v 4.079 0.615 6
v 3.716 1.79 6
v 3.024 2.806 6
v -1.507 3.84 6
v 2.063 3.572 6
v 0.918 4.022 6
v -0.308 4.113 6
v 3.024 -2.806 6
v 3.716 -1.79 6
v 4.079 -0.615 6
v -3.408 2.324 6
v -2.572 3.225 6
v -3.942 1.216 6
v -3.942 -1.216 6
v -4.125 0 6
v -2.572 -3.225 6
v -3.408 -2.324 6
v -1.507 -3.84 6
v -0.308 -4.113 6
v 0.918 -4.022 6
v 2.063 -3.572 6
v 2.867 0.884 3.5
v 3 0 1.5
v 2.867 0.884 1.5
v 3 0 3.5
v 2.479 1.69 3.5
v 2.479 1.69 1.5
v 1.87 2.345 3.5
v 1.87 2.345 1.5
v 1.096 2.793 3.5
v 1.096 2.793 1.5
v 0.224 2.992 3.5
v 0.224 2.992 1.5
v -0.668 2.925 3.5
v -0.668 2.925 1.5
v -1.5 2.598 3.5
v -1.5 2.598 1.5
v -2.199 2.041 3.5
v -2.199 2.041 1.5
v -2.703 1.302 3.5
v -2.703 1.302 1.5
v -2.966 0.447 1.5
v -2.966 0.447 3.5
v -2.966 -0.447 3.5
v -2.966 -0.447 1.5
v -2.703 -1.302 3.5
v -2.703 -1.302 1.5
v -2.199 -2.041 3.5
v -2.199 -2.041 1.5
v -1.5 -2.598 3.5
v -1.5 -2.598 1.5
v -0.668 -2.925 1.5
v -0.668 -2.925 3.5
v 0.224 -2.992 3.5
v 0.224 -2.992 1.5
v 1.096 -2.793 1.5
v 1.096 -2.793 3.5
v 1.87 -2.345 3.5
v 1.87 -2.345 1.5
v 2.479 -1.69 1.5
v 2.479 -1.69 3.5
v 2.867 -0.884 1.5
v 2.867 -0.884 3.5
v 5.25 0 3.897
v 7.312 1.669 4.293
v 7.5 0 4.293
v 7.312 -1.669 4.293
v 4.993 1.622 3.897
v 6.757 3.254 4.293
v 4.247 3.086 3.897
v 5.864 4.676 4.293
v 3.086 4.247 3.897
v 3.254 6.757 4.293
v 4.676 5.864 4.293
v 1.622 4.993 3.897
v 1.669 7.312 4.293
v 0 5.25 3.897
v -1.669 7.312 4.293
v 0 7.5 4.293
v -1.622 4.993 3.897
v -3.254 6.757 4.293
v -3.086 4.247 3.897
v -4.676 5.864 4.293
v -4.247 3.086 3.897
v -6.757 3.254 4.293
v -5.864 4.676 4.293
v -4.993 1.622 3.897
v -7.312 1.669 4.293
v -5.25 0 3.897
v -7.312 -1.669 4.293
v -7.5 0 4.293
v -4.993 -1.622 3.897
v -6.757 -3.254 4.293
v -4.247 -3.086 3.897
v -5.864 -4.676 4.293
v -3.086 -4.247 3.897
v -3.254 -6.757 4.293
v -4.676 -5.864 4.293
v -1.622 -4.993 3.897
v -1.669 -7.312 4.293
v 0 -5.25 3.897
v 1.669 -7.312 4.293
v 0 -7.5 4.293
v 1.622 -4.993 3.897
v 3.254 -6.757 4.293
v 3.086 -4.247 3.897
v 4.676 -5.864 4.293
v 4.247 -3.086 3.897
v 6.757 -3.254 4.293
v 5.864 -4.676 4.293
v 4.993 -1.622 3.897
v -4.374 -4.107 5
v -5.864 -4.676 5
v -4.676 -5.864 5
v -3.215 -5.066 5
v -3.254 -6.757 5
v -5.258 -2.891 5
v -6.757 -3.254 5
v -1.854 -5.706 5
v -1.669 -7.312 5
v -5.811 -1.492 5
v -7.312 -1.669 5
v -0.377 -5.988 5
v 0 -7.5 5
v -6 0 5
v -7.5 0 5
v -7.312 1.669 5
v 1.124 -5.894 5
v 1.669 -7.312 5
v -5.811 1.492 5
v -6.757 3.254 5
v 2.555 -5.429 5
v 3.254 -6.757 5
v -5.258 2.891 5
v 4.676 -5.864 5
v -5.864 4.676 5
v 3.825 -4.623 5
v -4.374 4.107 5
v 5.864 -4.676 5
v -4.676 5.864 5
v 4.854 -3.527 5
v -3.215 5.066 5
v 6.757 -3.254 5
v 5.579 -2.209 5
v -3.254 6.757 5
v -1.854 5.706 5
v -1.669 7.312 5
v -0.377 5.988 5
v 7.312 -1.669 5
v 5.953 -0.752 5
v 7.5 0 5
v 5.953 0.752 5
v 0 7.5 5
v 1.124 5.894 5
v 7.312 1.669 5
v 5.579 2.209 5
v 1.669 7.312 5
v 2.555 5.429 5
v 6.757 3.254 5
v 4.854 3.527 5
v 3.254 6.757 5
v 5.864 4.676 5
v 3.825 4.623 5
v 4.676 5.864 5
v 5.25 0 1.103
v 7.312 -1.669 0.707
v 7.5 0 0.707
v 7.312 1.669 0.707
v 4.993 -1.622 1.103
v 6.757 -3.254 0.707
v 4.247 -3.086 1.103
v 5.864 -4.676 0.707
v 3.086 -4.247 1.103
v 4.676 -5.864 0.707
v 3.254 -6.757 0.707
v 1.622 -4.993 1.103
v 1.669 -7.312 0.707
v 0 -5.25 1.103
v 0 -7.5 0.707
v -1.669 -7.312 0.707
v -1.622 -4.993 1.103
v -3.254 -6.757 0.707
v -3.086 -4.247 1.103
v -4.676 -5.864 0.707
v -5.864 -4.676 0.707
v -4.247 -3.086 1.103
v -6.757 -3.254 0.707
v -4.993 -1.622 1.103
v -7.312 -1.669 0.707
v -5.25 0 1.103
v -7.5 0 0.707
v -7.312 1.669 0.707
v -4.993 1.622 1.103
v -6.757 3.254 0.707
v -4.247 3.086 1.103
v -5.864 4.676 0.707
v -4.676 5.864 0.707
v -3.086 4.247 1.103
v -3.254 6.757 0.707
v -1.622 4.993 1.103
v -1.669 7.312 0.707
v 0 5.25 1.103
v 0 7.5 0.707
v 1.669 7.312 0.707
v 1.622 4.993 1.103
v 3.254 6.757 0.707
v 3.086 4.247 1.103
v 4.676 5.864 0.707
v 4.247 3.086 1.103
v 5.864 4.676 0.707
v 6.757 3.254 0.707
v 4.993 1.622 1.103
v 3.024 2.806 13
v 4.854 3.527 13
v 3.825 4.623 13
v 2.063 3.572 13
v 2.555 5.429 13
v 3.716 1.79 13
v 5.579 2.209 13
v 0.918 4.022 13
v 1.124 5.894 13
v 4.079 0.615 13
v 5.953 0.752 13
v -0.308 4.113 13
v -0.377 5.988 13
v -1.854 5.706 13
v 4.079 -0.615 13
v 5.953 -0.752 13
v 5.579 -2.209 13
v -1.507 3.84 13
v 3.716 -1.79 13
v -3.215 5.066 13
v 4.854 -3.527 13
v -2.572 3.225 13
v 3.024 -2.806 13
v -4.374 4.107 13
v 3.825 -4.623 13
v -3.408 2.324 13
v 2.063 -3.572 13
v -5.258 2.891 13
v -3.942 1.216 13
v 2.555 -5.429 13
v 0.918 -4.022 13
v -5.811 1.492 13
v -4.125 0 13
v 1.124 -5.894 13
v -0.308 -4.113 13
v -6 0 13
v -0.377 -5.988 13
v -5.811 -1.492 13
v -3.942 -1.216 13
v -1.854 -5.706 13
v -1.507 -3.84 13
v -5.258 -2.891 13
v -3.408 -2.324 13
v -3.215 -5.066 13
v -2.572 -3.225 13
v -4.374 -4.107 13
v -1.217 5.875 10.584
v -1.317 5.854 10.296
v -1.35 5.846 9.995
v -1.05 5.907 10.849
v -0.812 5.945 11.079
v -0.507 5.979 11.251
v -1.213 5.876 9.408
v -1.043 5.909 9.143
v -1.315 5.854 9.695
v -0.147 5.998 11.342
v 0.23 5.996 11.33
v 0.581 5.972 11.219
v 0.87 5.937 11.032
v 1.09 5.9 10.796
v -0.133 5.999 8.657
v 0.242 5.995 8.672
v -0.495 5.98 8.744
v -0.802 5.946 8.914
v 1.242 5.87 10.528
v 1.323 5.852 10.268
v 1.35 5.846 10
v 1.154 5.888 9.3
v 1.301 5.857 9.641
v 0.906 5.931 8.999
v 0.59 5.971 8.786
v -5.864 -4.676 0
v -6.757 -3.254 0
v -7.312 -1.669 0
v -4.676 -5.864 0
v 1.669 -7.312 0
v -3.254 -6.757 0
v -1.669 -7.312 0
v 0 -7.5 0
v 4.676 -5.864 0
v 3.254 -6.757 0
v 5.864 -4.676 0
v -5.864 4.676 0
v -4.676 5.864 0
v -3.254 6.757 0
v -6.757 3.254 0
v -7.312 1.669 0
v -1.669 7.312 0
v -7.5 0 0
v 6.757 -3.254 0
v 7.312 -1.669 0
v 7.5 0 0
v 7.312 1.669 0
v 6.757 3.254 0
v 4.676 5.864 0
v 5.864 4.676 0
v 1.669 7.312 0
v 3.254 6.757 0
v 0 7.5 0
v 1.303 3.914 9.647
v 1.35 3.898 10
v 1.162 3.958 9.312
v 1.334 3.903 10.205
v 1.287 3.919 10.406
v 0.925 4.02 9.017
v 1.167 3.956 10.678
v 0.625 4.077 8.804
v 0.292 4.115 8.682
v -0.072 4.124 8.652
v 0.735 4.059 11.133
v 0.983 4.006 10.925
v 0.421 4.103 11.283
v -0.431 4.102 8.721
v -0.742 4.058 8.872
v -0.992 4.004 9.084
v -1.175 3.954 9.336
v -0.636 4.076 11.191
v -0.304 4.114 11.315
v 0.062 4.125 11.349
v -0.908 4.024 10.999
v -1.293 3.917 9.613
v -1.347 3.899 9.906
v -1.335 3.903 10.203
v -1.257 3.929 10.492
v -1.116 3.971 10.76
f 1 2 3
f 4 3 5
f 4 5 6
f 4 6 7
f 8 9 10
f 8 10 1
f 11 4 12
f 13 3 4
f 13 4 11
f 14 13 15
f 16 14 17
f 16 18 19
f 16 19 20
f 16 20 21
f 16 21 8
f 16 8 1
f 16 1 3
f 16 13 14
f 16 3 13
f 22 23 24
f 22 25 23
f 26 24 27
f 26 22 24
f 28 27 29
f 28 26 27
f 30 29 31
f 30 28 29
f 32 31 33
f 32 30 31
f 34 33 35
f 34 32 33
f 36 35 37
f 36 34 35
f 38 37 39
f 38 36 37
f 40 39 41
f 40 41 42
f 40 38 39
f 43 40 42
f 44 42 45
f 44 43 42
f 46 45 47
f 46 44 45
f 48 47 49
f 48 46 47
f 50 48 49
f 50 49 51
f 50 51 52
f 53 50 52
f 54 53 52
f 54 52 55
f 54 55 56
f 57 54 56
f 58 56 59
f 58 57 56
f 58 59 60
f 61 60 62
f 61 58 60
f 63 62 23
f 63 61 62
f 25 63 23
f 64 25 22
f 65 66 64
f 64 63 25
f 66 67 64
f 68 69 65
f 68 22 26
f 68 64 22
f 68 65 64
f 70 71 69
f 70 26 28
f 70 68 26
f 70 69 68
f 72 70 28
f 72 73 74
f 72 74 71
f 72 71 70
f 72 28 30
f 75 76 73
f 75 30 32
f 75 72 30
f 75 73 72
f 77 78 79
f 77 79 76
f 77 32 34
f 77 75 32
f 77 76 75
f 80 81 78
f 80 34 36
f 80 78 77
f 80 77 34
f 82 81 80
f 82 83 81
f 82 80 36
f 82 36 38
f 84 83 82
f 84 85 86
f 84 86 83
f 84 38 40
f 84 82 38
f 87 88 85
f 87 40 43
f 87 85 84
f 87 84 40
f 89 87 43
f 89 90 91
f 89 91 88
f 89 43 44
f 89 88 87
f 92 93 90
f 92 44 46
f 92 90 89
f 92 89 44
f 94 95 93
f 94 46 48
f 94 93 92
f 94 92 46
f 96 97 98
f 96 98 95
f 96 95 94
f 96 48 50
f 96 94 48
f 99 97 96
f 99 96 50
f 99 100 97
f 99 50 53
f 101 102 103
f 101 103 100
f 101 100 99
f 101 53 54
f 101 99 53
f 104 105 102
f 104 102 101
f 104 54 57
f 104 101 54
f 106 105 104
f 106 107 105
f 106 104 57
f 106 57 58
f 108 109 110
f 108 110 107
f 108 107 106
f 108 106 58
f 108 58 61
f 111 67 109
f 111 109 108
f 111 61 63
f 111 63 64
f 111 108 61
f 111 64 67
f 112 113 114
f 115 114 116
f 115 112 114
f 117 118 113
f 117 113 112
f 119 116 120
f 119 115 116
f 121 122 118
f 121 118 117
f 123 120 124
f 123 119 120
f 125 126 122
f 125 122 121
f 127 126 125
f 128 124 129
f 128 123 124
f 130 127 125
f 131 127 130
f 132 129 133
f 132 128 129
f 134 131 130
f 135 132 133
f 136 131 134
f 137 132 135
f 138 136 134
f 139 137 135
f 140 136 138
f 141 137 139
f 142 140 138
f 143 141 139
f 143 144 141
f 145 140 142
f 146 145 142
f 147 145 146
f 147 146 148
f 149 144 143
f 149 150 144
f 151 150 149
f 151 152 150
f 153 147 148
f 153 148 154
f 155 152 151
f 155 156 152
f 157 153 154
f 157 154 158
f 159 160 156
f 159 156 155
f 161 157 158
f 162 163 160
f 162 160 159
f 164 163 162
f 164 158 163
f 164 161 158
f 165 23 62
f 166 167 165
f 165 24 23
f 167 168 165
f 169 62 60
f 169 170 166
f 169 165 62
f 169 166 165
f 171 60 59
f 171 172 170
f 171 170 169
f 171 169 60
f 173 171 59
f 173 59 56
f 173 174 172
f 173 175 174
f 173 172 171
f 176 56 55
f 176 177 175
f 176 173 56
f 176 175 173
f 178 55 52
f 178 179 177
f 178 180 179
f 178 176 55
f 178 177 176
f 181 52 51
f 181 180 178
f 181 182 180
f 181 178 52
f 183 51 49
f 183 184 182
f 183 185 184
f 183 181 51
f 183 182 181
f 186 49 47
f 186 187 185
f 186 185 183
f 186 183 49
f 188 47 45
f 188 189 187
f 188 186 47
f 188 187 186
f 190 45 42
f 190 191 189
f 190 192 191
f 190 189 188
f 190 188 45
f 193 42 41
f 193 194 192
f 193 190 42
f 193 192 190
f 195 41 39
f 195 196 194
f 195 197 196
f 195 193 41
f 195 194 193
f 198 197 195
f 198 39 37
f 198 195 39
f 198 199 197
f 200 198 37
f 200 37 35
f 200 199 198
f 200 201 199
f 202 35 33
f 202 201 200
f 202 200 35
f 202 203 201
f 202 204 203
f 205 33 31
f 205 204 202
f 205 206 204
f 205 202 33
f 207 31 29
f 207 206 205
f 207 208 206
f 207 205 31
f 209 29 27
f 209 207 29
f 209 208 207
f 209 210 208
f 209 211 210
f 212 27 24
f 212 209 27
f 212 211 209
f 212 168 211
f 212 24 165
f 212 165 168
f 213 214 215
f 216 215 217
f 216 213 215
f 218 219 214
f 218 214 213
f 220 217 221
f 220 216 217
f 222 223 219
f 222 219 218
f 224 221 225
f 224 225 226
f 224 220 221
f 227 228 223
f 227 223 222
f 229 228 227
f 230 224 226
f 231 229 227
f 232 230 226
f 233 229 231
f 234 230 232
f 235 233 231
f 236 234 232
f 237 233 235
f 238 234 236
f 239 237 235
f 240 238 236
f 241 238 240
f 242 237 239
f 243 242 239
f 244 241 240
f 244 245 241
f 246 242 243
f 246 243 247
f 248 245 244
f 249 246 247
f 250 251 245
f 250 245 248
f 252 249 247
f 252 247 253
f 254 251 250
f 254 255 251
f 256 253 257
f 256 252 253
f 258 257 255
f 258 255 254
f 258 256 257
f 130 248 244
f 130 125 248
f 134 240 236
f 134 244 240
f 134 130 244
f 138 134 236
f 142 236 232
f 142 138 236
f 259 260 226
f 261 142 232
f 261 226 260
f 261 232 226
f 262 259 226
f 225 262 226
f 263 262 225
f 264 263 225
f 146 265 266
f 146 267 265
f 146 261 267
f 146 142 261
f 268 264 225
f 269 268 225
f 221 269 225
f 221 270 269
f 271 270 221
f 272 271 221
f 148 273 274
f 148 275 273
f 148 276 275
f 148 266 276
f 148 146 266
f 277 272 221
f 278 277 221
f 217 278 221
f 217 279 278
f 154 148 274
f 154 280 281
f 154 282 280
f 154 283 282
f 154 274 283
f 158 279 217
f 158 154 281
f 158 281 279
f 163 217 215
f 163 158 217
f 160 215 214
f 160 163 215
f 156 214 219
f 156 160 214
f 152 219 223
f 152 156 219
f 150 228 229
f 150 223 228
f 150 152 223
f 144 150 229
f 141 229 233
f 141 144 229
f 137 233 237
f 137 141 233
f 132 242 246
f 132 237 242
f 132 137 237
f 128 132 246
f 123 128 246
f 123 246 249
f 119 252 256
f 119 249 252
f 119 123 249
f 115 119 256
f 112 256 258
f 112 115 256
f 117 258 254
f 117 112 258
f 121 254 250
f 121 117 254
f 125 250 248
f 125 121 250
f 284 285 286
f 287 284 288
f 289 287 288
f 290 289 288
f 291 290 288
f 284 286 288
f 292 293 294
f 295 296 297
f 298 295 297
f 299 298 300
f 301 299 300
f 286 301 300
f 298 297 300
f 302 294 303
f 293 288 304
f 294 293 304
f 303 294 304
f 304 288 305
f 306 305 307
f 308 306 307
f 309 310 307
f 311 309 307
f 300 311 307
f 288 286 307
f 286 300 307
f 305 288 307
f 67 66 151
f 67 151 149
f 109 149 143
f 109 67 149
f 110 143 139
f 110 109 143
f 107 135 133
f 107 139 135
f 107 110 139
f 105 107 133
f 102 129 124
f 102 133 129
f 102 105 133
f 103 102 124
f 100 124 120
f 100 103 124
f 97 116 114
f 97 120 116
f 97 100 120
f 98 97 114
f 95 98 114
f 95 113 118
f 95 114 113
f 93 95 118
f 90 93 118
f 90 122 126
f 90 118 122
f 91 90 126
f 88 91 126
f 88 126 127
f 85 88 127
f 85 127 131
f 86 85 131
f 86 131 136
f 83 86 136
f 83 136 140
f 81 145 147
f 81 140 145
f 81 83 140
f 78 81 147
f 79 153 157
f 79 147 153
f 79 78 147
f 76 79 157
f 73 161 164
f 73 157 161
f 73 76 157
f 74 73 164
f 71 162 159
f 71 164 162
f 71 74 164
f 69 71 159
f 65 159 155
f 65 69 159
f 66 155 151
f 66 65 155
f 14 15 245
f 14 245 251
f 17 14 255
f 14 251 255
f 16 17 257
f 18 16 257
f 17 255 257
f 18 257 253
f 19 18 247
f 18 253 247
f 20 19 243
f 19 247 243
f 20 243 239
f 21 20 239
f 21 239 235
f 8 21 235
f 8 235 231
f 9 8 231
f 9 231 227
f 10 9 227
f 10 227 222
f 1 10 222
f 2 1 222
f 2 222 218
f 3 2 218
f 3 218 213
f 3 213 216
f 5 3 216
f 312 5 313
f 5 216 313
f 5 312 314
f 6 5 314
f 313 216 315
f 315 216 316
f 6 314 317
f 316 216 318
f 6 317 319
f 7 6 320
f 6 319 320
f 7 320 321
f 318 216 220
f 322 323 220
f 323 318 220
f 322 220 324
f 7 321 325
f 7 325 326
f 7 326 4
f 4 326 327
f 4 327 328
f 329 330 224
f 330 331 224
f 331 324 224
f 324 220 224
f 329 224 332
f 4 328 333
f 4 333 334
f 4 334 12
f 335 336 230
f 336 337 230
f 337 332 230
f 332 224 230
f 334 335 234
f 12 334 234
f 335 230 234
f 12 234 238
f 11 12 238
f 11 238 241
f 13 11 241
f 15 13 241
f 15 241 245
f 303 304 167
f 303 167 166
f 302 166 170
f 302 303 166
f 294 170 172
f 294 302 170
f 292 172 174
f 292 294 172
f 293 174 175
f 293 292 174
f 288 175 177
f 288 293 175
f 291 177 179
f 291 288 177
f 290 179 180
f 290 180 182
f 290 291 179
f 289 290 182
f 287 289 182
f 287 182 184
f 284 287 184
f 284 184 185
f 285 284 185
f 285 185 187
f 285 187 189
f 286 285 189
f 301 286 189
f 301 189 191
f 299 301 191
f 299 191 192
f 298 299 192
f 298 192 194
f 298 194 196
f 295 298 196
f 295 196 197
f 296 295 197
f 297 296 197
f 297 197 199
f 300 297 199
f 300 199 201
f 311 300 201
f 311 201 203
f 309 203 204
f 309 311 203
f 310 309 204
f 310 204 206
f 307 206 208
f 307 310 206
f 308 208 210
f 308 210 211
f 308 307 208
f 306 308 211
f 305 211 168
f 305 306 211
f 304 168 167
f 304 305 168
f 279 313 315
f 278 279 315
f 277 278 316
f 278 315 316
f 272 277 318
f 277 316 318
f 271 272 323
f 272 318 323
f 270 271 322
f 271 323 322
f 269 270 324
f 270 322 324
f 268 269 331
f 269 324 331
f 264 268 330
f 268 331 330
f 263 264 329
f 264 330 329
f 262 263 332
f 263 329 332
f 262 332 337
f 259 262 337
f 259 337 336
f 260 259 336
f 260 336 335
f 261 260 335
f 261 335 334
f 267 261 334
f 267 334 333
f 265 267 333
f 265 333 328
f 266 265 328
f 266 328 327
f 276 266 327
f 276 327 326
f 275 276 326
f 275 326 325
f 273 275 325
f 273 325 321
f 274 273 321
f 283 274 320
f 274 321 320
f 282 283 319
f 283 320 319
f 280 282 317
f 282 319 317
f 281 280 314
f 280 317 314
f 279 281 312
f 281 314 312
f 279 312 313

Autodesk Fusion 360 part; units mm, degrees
sketch "Esquisse1" plane through (0, 0, 0) normal (0, 0, 1) x (1, 0, 0)
  circle A0 centre (0, 0) radius 7.5
  dimension "d1" = 15
extrude "Extrusion1" add sketch "Esquisse1" along normal blind 5
sketch "Esquisse2" plane through (0, 0, 0) normal (0, 1, 0) x (1, 0, 0)
sketch "Esquisse3" plane through (0, 0, 0) normal (0, 1, 0) x (1, 0, 0)
  line L0 (3, -3.5) -> (8.18, -4.4134)
  line L1 (8.18, -4.4134) -> (8.18, -0.5866)
  line L2 (8.18, -0.5866) -> (3, -1.5)
  line L3 (3, -1.5) -> (3, -3.5)
  line L4 (0, -1.75) -> (0, -22.5)
  dimension "d4" = 2
  dimension "d6" = 1.5
  dimension "d7" = 100
  dimension "d8" = 100
  dimension "d9" = 3
revolve "Révolution1" cut sketch "Esquisse3" angle 360 about axis through (0, 0, 1.75) along (0, 0, 1)
sketch "Esquisse4" plane through (0, 0, 5) normal (0, 0, 1) x (-1, 0, 0)
  circle A0 centre (0, 0) radius 7.5
  circle A1 centre (0, 0) radius 6
  dimension "d11" = 12
extrude "Extrusion2" add sketch "Esquisse4" along normal blind 8 contours A1
sketch "Esquisse5" plane through (0, 0, 13) normal (0, 0, 1) x (-1, 0, 0)
  circle A0 centre (0, 0) radius 6
  circle A1 centre (0, 0) radius 4.125
  dimension "d14" = 8.25
sketch "Esquisse6" plane through (0, 0, 13) normal (0, 0, 1) x (1, 0, 0)
extrude "Extrusion3" cut sketch "Esquisse5" against normal blind 7 contours A1
sketch "Esquisse7" plane through (0, 0, 0) normal (0, 1, 0) x (1, 0, 0)
  circle A0 centre (0, -10) radius 1.35
  line L0 (-6, -13) -> (6, -13)
  dimension "d17" = 2.7
  dimension "d18" = 3
extrude "Extrusion4" cut sketch "Esquisse7" along normal blind 15.5
